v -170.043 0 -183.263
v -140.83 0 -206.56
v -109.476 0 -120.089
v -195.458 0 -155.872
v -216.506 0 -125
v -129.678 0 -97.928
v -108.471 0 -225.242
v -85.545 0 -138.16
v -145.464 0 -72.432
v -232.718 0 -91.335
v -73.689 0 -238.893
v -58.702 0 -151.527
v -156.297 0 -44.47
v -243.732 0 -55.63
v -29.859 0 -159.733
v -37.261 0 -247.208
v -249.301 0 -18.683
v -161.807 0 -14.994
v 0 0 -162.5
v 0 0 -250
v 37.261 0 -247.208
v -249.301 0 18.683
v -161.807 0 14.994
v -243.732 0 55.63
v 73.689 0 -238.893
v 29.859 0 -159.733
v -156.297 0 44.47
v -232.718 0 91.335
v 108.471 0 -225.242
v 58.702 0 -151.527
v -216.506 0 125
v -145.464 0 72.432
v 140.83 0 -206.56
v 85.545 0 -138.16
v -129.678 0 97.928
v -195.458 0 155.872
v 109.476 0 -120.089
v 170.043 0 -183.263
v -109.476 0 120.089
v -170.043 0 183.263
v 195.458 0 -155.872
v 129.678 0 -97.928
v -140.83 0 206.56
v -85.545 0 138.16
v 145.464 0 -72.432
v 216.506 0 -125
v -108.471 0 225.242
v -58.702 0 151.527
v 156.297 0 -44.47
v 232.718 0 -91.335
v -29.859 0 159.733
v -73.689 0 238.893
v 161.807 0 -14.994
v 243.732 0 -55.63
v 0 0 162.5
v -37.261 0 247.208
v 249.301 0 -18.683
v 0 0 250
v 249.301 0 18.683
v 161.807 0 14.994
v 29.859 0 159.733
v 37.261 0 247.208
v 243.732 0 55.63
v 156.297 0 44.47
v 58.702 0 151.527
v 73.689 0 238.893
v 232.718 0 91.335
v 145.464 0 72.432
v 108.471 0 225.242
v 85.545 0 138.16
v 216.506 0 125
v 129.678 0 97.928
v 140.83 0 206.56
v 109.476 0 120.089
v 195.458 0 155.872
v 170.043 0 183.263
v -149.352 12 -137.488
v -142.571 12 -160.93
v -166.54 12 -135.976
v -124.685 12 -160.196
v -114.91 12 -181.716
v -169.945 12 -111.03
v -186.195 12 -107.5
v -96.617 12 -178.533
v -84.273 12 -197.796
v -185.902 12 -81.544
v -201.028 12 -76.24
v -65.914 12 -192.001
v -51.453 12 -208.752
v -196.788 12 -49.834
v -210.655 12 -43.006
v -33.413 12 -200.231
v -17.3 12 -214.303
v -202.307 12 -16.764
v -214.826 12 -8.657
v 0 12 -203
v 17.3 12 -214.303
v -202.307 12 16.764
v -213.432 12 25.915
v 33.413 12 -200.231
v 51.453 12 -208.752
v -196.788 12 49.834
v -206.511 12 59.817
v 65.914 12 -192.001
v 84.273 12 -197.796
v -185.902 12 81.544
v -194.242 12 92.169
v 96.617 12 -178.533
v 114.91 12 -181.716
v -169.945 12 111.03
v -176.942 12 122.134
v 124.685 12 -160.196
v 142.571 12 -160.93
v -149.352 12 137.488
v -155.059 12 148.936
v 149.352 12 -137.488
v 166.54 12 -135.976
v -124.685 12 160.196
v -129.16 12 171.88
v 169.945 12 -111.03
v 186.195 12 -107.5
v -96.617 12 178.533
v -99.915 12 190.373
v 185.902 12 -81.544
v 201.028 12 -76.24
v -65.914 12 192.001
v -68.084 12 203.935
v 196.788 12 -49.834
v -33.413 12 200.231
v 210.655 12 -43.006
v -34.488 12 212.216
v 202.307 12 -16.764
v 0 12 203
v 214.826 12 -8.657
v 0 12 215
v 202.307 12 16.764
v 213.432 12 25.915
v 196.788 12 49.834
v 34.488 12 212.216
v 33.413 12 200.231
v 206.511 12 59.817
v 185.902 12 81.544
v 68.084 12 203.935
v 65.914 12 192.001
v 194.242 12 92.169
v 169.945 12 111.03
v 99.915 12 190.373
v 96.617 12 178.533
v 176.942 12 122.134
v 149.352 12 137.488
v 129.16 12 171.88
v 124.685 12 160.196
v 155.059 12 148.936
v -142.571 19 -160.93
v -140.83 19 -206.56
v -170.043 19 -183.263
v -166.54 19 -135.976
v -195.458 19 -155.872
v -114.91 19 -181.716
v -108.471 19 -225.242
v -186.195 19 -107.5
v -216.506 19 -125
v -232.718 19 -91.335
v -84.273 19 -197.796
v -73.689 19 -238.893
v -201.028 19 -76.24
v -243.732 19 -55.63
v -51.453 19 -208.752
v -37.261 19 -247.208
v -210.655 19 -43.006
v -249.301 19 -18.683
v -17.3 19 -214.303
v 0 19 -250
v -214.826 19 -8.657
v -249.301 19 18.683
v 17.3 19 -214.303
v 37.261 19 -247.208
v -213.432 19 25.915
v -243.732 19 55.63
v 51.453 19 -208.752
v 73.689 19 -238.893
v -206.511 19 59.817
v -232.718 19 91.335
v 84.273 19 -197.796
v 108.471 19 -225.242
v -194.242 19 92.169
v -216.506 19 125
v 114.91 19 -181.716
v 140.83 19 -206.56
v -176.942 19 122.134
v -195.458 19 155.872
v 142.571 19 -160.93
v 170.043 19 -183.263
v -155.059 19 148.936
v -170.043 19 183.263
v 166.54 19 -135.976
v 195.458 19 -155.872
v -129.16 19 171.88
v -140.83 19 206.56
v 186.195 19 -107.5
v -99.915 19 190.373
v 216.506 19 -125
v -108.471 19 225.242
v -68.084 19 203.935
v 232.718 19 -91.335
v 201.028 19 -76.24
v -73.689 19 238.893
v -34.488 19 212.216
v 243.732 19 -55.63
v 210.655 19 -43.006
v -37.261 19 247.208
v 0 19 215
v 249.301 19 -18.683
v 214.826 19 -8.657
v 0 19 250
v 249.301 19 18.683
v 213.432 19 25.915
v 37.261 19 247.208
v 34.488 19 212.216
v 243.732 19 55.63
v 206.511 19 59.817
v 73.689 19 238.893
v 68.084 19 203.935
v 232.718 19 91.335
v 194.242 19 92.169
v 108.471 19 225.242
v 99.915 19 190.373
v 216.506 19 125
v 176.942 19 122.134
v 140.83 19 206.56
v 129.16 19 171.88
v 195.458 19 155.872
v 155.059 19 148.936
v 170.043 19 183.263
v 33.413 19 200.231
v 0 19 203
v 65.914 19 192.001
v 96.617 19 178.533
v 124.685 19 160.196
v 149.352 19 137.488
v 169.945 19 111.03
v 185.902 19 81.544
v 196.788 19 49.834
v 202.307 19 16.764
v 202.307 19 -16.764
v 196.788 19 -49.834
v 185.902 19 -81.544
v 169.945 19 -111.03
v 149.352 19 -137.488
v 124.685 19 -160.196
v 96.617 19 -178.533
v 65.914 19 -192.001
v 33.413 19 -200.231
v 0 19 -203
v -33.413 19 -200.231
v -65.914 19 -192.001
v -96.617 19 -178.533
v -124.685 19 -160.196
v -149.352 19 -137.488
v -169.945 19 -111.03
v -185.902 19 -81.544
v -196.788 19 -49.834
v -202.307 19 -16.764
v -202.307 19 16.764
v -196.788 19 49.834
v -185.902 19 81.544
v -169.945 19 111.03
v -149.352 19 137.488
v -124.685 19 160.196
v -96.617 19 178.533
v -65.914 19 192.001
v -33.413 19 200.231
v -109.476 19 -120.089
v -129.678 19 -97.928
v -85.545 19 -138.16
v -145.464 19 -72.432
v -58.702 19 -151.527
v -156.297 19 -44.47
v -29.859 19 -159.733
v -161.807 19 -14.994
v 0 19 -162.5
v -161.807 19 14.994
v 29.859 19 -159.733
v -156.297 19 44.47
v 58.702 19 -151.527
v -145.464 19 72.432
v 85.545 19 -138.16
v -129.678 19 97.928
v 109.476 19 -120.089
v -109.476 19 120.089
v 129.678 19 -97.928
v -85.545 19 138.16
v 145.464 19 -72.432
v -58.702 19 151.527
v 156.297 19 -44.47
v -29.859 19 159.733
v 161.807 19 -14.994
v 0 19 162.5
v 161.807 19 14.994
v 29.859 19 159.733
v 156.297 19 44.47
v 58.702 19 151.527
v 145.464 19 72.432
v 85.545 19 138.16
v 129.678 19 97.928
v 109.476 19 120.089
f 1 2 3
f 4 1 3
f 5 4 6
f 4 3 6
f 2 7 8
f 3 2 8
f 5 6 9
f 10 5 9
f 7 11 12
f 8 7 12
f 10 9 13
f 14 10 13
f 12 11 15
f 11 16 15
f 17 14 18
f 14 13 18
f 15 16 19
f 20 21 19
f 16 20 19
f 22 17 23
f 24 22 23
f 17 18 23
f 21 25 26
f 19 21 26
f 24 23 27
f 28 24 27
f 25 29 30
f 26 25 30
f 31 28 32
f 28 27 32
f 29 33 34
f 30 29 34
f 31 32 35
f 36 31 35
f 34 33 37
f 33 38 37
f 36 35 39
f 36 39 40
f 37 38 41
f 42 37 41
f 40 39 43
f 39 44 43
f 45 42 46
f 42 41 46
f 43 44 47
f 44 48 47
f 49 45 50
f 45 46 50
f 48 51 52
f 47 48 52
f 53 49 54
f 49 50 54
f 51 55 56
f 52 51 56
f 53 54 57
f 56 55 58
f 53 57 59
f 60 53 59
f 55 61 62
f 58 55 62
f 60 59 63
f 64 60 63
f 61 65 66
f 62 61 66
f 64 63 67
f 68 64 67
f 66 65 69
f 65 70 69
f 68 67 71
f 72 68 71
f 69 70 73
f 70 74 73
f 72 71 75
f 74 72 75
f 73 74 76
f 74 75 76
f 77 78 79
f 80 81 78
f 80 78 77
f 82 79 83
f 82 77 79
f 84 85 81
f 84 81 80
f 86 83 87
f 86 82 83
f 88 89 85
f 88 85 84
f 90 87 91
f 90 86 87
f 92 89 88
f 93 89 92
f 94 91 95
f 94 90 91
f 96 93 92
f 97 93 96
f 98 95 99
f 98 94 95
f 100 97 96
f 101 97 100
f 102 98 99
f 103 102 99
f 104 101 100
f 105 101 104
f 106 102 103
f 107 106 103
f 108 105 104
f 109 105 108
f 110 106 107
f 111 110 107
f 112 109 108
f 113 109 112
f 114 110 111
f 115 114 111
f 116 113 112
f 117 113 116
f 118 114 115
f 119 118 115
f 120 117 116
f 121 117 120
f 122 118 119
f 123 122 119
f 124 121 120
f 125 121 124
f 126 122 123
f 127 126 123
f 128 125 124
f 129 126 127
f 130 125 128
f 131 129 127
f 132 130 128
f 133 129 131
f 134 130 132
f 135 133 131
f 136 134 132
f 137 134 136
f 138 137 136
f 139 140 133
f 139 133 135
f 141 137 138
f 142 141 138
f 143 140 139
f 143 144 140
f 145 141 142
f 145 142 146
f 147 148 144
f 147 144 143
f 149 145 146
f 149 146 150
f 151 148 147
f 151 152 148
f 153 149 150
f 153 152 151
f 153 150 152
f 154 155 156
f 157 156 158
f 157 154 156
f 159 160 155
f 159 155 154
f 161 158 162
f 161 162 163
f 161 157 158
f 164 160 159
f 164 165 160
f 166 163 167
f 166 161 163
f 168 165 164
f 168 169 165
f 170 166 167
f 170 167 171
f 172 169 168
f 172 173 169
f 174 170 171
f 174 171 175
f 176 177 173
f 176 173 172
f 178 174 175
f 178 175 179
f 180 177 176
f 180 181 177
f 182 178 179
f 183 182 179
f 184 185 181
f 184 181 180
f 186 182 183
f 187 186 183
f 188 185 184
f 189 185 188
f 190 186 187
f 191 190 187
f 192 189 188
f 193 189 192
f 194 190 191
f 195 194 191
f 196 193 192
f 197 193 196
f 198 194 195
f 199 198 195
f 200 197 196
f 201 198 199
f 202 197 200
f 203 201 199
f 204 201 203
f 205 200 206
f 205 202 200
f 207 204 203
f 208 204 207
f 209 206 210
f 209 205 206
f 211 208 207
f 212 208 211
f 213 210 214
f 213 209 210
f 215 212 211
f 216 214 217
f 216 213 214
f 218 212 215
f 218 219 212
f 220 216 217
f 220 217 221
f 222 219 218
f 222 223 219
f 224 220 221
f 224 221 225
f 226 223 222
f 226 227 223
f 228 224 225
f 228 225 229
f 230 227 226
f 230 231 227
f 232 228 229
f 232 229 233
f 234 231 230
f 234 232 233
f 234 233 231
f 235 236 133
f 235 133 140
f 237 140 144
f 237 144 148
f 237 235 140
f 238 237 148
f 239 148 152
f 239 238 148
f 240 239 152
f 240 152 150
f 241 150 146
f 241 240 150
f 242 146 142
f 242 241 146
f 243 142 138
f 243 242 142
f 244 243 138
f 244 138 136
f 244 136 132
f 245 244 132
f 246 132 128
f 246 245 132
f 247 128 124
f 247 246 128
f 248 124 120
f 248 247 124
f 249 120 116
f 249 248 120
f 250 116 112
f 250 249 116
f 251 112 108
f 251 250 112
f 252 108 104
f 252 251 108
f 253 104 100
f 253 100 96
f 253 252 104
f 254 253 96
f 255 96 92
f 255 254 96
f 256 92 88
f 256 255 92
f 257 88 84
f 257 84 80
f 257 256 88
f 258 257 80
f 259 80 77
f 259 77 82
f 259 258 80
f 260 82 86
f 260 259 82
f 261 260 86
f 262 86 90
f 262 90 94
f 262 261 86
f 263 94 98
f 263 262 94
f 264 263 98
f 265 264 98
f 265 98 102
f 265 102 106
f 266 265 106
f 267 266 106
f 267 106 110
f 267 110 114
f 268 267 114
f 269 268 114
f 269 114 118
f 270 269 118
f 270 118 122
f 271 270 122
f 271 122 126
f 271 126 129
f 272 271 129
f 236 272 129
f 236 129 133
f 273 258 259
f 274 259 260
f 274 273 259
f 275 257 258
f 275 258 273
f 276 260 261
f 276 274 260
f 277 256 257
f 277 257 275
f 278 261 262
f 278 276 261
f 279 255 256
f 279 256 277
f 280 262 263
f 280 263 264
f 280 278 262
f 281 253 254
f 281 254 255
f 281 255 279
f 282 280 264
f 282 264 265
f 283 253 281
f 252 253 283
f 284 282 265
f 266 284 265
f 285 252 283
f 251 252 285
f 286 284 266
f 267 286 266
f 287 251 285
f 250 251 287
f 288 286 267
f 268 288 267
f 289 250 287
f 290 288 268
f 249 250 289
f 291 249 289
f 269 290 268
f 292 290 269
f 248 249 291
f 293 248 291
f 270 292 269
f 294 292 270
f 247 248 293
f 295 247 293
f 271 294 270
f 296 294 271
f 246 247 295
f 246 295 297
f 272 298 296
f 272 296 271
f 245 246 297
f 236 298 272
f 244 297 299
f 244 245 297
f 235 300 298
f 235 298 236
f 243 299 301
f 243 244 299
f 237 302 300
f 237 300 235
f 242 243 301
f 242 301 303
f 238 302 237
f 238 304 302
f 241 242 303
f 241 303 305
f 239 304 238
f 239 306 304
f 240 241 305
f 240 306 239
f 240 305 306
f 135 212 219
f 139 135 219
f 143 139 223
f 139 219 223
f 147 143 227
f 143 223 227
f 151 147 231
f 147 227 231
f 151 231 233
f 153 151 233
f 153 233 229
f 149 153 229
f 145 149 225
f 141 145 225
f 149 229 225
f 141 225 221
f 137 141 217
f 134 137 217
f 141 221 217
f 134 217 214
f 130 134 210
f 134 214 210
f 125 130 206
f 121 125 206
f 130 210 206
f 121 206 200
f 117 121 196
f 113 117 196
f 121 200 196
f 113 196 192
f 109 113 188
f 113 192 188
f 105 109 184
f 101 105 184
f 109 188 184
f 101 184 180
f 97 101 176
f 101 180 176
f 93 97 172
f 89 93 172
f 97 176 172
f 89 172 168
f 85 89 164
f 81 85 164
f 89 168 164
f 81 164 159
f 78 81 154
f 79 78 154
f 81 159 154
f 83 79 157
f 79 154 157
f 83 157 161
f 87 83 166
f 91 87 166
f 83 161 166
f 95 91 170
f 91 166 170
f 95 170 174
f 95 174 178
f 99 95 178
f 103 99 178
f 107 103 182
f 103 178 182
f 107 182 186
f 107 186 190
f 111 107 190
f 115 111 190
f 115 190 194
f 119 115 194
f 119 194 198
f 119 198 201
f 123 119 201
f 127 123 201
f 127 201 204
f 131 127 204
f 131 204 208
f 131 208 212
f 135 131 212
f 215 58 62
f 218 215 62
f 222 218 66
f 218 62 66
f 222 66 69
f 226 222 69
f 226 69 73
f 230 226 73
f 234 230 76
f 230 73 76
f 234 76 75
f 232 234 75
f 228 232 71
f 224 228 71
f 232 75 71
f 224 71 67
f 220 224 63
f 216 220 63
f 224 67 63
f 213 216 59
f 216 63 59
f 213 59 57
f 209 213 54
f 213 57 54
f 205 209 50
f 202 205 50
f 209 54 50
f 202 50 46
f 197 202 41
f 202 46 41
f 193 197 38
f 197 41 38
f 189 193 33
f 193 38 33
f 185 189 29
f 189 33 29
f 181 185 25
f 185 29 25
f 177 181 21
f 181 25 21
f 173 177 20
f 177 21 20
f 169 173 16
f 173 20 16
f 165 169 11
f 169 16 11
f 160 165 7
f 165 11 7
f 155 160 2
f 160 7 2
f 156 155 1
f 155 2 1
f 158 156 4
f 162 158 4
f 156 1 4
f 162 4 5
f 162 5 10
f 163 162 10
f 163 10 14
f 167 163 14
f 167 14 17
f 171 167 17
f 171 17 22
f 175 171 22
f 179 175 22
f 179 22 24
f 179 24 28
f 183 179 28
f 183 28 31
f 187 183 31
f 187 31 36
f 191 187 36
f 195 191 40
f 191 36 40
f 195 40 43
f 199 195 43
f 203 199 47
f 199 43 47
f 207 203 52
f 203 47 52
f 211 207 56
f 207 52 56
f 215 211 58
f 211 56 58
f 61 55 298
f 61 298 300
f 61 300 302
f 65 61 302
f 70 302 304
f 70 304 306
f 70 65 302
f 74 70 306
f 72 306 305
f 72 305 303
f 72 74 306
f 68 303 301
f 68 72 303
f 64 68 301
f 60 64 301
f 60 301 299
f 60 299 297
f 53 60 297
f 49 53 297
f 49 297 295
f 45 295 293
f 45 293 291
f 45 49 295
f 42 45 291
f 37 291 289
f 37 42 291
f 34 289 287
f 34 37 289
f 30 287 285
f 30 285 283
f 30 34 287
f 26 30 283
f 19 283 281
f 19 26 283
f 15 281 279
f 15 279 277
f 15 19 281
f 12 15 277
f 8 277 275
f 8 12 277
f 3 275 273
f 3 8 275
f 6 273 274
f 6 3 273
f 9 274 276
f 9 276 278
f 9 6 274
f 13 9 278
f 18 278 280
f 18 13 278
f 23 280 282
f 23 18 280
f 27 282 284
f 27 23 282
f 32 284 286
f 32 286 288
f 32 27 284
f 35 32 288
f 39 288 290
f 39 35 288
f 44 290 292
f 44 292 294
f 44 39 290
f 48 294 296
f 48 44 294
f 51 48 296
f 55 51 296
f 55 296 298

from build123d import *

# Parameters (mm, degrees)
SKETCH1_R           = 250
SKETCH1_R_2         = 162.5
BOSS_EXTRUDE1_DEPTH = 19
SKETCH2_R           = 215
SKETCH2_R_2         = 203
CUT_EXTRUDE1_DEPTH  = 7


with BuildPart() as part:
    # Sketch1 → Boss-Extrude1 (new body)
    with BuildSketch(Plane(origin=(0, 0, 0), x_dir=(1, 0, 0), z_dir=(0, 1, 0))):
        with Locations(Location((0, 0, 0), (0, 0, 270))):
            Circle(SKETCH1_R)
        with Locations(Location((0, 0, 0), (0, 0, 270))):
            Circle(SKETCH1_R_2, mode=Mode.SUBTRACT)
    extrude(amount=BOSS_EXTRUDE1_DEPTH)

    # Sketch2 → Cut-Extrude1 (cut)
    with BuildSketch(Plane(origin=(0, 19, 0), x_dir=(1, 0, 0), z_dir=(0, 1, 0))):
        with Locations(Location((0, 0, 0), (0, 0, 270))):
            Circle(SKETCH2_R)
        with Locations(Location((0, 0, 0), (0, 0, 270))):
            Circle(SKETCH2_R_2, mode=Mode.SUBTRACT)
    extrude(amount=-CUT_EXTRUDE1_DEPTH, mode=Mode.SUBTRACT)


solid = part.part
